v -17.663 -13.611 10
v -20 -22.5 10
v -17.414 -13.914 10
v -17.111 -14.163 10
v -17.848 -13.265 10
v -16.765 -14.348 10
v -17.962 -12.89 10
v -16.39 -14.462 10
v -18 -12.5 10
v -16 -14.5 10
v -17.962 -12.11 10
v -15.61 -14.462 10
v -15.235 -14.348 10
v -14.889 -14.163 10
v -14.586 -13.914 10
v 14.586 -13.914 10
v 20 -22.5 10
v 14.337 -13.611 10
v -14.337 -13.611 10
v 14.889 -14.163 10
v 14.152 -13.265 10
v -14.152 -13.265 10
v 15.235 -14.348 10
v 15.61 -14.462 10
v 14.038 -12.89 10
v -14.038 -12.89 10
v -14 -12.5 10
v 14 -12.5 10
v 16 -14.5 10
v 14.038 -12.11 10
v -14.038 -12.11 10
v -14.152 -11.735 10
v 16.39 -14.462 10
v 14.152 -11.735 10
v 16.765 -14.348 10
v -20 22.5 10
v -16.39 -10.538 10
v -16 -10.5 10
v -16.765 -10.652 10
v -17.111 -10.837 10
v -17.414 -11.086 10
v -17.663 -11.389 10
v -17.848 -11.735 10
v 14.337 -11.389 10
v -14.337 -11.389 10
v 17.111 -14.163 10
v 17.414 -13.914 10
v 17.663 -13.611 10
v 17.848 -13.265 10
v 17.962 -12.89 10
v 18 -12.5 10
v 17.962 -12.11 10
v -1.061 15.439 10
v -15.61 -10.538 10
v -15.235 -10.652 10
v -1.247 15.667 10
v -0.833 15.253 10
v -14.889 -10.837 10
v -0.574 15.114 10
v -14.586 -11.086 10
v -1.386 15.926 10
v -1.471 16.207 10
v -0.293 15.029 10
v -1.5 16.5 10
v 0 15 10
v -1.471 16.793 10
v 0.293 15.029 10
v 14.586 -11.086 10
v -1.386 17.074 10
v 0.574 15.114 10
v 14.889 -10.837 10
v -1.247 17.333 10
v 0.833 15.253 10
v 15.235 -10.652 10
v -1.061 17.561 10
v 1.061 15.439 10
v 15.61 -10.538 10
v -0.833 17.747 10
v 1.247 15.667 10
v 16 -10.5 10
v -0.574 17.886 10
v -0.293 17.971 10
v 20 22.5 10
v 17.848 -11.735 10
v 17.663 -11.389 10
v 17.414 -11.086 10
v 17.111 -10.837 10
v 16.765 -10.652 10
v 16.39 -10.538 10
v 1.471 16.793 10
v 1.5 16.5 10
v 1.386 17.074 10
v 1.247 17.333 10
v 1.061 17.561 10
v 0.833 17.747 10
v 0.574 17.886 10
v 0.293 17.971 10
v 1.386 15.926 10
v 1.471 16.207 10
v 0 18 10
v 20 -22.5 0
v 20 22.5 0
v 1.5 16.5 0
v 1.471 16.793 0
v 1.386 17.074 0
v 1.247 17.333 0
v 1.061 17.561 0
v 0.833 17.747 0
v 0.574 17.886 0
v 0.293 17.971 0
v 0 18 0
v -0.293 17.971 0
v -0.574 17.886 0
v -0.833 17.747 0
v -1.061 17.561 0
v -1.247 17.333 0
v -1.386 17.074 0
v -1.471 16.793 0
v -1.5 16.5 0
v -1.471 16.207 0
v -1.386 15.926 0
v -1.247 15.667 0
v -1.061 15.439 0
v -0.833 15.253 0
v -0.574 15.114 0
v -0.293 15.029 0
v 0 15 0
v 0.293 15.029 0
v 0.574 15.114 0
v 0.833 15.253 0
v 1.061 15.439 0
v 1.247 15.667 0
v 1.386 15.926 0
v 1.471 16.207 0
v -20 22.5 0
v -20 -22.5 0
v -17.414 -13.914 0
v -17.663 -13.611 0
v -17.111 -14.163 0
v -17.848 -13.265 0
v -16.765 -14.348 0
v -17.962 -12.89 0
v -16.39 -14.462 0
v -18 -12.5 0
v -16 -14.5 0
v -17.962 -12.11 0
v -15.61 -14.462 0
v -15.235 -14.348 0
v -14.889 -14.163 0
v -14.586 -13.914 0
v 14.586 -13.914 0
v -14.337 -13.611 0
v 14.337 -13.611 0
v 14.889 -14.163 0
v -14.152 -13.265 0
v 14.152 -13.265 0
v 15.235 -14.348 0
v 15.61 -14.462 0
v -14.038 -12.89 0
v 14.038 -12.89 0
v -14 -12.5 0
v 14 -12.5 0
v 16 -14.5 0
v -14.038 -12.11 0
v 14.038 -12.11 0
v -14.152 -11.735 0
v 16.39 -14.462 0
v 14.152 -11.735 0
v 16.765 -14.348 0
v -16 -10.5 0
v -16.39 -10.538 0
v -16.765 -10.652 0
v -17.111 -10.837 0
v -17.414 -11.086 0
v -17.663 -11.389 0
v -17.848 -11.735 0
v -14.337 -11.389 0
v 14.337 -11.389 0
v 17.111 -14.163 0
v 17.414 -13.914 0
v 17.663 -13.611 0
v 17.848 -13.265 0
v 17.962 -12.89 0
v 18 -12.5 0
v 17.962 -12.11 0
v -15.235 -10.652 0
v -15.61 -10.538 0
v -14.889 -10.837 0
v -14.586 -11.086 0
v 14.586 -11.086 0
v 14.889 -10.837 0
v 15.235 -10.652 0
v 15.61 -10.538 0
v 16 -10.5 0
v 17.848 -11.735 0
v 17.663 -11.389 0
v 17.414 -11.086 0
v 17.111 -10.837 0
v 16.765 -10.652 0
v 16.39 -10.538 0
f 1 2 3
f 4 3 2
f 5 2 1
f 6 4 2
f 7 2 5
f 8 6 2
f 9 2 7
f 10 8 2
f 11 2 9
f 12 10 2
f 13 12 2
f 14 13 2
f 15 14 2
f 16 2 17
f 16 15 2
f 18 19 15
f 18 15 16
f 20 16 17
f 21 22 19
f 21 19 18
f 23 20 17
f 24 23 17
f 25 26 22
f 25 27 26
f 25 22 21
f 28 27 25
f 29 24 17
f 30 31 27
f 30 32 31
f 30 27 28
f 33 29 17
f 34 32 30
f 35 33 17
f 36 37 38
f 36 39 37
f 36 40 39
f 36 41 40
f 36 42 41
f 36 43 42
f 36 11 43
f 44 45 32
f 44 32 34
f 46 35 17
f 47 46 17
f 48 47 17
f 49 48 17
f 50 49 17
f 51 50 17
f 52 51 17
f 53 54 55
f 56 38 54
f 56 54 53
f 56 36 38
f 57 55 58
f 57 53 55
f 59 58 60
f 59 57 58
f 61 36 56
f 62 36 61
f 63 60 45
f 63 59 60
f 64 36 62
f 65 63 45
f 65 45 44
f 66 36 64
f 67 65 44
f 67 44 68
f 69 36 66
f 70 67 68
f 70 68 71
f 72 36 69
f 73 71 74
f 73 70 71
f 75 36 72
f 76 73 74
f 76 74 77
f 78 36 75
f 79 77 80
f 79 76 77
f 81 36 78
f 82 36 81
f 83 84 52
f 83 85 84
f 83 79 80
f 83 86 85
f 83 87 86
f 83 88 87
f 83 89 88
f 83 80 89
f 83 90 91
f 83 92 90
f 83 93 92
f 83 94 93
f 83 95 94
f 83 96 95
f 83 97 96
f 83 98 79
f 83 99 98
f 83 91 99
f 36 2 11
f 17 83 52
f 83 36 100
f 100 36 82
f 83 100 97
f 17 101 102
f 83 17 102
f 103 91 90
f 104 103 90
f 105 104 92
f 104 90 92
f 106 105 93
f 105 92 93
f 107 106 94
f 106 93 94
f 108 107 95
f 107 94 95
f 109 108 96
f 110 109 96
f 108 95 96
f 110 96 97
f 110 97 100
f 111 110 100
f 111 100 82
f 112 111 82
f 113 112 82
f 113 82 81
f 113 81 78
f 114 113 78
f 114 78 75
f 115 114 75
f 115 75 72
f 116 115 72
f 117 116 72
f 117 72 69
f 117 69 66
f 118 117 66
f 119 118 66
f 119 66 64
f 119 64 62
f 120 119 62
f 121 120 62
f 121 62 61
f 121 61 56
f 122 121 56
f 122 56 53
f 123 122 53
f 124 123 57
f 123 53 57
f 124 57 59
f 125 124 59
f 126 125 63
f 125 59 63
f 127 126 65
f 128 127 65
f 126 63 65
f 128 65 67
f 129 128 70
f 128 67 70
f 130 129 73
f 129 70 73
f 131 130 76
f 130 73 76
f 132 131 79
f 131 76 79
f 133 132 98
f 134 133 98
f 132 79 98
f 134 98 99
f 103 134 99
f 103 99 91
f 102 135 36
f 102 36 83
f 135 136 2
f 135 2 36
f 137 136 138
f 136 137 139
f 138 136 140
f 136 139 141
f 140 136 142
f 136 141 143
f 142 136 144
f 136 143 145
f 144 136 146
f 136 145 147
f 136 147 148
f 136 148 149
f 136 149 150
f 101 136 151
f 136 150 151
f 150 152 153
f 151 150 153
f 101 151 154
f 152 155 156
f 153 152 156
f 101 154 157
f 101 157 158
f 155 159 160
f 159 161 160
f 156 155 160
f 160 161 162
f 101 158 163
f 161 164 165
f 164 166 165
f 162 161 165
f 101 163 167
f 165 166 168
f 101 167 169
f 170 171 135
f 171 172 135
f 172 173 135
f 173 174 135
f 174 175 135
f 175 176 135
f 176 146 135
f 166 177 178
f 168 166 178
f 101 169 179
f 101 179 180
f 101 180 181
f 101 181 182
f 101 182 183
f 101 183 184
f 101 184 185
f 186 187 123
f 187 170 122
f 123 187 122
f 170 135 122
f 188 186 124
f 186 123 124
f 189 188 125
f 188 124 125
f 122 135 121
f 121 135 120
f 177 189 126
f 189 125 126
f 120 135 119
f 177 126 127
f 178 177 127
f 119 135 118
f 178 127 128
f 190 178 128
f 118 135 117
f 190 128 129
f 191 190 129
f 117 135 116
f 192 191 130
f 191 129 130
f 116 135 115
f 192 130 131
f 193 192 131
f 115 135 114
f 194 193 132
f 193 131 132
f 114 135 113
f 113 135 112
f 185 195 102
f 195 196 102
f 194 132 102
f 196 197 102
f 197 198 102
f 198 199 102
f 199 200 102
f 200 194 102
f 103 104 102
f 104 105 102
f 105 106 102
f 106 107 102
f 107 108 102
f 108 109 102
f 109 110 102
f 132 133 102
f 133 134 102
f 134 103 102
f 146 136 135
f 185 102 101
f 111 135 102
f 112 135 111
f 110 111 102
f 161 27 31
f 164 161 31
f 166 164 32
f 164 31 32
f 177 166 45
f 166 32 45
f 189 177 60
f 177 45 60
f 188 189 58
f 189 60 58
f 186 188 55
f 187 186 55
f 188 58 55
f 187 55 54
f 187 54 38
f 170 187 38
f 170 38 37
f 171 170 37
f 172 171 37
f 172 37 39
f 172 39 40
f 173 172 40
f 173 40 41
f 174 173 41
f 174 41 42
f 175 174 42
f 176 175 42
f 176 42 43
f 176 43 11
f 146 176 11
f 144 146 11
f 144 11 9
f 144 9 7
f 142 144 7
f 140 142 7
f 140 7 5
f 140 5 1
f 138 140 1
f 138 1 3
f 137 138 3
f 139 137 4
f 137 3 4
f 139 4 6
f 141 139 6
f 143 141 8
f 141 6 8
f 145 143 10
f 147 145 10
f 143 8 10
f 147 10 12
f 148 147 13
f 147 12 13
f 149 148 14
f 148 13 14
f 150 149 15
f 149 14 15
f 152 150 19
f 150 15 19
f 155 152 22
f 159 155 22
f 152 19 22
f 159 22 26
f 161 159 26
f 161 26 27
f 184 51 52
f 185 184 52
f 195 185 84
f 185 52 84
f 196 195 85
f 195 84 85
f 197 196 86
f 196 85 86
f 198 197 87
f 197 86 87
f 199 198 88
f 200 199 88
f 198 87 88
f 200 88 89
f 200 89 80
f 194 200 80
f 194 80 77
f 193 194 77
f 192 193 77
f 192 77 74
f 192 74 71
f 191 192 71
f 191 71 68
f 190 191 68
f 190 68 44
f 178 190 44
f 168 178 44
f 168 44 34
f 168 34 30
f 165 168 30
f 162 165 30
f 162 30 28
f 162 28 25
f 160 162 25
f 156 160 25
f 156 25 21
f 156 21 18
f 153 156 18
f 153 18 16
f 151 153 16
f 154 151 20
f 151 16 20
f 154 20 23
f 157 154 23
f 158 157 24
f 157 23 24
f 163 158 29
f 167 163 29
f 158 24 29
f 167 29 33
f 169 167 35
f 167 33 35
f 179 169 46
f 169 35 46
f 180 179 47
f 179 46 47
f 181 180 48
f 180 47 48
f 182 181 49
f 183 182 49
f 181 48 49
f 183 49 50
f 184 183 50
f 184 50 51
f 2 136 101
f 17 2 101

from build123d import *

# Parameters (mm, degrees)
F0_W     = 40
F0_H     = 45
F1_DEPTH = 10
F2_R     = 1.5
F3_DEPTH = 25
F4_R     = 2
F5_DEPTH = 25


with BuildPart() as f1:
    # F0 (on Top) → F1 (new body)
    with BuildSketch(Plane.XY):
        Rectangle(F0_W, F0_H)
    extrude(amount=F1_DEPTH)

    # F2 (on face) → F3 (cut)
    with BuildSketch(Plane.XY.offset(10)):
        with Locations((0, 16.5)):
            Circle(F2_R)
    extrude(amount=-F3_DEPTH, mode=Mode.SUBTRACT)

    # F4 (on face) → F5 (cut)
    with BuildSketch(Plane.XY.offset(10)):
        with Locations((16, -12.5)):
            Circle(F4_R)
        with Locations((-16, -12.5)):
            Circle(F4_R)
    extrude(amount=-F5_DEPTH, mode=Mode.SUBTRACT)


solid = f1.part
